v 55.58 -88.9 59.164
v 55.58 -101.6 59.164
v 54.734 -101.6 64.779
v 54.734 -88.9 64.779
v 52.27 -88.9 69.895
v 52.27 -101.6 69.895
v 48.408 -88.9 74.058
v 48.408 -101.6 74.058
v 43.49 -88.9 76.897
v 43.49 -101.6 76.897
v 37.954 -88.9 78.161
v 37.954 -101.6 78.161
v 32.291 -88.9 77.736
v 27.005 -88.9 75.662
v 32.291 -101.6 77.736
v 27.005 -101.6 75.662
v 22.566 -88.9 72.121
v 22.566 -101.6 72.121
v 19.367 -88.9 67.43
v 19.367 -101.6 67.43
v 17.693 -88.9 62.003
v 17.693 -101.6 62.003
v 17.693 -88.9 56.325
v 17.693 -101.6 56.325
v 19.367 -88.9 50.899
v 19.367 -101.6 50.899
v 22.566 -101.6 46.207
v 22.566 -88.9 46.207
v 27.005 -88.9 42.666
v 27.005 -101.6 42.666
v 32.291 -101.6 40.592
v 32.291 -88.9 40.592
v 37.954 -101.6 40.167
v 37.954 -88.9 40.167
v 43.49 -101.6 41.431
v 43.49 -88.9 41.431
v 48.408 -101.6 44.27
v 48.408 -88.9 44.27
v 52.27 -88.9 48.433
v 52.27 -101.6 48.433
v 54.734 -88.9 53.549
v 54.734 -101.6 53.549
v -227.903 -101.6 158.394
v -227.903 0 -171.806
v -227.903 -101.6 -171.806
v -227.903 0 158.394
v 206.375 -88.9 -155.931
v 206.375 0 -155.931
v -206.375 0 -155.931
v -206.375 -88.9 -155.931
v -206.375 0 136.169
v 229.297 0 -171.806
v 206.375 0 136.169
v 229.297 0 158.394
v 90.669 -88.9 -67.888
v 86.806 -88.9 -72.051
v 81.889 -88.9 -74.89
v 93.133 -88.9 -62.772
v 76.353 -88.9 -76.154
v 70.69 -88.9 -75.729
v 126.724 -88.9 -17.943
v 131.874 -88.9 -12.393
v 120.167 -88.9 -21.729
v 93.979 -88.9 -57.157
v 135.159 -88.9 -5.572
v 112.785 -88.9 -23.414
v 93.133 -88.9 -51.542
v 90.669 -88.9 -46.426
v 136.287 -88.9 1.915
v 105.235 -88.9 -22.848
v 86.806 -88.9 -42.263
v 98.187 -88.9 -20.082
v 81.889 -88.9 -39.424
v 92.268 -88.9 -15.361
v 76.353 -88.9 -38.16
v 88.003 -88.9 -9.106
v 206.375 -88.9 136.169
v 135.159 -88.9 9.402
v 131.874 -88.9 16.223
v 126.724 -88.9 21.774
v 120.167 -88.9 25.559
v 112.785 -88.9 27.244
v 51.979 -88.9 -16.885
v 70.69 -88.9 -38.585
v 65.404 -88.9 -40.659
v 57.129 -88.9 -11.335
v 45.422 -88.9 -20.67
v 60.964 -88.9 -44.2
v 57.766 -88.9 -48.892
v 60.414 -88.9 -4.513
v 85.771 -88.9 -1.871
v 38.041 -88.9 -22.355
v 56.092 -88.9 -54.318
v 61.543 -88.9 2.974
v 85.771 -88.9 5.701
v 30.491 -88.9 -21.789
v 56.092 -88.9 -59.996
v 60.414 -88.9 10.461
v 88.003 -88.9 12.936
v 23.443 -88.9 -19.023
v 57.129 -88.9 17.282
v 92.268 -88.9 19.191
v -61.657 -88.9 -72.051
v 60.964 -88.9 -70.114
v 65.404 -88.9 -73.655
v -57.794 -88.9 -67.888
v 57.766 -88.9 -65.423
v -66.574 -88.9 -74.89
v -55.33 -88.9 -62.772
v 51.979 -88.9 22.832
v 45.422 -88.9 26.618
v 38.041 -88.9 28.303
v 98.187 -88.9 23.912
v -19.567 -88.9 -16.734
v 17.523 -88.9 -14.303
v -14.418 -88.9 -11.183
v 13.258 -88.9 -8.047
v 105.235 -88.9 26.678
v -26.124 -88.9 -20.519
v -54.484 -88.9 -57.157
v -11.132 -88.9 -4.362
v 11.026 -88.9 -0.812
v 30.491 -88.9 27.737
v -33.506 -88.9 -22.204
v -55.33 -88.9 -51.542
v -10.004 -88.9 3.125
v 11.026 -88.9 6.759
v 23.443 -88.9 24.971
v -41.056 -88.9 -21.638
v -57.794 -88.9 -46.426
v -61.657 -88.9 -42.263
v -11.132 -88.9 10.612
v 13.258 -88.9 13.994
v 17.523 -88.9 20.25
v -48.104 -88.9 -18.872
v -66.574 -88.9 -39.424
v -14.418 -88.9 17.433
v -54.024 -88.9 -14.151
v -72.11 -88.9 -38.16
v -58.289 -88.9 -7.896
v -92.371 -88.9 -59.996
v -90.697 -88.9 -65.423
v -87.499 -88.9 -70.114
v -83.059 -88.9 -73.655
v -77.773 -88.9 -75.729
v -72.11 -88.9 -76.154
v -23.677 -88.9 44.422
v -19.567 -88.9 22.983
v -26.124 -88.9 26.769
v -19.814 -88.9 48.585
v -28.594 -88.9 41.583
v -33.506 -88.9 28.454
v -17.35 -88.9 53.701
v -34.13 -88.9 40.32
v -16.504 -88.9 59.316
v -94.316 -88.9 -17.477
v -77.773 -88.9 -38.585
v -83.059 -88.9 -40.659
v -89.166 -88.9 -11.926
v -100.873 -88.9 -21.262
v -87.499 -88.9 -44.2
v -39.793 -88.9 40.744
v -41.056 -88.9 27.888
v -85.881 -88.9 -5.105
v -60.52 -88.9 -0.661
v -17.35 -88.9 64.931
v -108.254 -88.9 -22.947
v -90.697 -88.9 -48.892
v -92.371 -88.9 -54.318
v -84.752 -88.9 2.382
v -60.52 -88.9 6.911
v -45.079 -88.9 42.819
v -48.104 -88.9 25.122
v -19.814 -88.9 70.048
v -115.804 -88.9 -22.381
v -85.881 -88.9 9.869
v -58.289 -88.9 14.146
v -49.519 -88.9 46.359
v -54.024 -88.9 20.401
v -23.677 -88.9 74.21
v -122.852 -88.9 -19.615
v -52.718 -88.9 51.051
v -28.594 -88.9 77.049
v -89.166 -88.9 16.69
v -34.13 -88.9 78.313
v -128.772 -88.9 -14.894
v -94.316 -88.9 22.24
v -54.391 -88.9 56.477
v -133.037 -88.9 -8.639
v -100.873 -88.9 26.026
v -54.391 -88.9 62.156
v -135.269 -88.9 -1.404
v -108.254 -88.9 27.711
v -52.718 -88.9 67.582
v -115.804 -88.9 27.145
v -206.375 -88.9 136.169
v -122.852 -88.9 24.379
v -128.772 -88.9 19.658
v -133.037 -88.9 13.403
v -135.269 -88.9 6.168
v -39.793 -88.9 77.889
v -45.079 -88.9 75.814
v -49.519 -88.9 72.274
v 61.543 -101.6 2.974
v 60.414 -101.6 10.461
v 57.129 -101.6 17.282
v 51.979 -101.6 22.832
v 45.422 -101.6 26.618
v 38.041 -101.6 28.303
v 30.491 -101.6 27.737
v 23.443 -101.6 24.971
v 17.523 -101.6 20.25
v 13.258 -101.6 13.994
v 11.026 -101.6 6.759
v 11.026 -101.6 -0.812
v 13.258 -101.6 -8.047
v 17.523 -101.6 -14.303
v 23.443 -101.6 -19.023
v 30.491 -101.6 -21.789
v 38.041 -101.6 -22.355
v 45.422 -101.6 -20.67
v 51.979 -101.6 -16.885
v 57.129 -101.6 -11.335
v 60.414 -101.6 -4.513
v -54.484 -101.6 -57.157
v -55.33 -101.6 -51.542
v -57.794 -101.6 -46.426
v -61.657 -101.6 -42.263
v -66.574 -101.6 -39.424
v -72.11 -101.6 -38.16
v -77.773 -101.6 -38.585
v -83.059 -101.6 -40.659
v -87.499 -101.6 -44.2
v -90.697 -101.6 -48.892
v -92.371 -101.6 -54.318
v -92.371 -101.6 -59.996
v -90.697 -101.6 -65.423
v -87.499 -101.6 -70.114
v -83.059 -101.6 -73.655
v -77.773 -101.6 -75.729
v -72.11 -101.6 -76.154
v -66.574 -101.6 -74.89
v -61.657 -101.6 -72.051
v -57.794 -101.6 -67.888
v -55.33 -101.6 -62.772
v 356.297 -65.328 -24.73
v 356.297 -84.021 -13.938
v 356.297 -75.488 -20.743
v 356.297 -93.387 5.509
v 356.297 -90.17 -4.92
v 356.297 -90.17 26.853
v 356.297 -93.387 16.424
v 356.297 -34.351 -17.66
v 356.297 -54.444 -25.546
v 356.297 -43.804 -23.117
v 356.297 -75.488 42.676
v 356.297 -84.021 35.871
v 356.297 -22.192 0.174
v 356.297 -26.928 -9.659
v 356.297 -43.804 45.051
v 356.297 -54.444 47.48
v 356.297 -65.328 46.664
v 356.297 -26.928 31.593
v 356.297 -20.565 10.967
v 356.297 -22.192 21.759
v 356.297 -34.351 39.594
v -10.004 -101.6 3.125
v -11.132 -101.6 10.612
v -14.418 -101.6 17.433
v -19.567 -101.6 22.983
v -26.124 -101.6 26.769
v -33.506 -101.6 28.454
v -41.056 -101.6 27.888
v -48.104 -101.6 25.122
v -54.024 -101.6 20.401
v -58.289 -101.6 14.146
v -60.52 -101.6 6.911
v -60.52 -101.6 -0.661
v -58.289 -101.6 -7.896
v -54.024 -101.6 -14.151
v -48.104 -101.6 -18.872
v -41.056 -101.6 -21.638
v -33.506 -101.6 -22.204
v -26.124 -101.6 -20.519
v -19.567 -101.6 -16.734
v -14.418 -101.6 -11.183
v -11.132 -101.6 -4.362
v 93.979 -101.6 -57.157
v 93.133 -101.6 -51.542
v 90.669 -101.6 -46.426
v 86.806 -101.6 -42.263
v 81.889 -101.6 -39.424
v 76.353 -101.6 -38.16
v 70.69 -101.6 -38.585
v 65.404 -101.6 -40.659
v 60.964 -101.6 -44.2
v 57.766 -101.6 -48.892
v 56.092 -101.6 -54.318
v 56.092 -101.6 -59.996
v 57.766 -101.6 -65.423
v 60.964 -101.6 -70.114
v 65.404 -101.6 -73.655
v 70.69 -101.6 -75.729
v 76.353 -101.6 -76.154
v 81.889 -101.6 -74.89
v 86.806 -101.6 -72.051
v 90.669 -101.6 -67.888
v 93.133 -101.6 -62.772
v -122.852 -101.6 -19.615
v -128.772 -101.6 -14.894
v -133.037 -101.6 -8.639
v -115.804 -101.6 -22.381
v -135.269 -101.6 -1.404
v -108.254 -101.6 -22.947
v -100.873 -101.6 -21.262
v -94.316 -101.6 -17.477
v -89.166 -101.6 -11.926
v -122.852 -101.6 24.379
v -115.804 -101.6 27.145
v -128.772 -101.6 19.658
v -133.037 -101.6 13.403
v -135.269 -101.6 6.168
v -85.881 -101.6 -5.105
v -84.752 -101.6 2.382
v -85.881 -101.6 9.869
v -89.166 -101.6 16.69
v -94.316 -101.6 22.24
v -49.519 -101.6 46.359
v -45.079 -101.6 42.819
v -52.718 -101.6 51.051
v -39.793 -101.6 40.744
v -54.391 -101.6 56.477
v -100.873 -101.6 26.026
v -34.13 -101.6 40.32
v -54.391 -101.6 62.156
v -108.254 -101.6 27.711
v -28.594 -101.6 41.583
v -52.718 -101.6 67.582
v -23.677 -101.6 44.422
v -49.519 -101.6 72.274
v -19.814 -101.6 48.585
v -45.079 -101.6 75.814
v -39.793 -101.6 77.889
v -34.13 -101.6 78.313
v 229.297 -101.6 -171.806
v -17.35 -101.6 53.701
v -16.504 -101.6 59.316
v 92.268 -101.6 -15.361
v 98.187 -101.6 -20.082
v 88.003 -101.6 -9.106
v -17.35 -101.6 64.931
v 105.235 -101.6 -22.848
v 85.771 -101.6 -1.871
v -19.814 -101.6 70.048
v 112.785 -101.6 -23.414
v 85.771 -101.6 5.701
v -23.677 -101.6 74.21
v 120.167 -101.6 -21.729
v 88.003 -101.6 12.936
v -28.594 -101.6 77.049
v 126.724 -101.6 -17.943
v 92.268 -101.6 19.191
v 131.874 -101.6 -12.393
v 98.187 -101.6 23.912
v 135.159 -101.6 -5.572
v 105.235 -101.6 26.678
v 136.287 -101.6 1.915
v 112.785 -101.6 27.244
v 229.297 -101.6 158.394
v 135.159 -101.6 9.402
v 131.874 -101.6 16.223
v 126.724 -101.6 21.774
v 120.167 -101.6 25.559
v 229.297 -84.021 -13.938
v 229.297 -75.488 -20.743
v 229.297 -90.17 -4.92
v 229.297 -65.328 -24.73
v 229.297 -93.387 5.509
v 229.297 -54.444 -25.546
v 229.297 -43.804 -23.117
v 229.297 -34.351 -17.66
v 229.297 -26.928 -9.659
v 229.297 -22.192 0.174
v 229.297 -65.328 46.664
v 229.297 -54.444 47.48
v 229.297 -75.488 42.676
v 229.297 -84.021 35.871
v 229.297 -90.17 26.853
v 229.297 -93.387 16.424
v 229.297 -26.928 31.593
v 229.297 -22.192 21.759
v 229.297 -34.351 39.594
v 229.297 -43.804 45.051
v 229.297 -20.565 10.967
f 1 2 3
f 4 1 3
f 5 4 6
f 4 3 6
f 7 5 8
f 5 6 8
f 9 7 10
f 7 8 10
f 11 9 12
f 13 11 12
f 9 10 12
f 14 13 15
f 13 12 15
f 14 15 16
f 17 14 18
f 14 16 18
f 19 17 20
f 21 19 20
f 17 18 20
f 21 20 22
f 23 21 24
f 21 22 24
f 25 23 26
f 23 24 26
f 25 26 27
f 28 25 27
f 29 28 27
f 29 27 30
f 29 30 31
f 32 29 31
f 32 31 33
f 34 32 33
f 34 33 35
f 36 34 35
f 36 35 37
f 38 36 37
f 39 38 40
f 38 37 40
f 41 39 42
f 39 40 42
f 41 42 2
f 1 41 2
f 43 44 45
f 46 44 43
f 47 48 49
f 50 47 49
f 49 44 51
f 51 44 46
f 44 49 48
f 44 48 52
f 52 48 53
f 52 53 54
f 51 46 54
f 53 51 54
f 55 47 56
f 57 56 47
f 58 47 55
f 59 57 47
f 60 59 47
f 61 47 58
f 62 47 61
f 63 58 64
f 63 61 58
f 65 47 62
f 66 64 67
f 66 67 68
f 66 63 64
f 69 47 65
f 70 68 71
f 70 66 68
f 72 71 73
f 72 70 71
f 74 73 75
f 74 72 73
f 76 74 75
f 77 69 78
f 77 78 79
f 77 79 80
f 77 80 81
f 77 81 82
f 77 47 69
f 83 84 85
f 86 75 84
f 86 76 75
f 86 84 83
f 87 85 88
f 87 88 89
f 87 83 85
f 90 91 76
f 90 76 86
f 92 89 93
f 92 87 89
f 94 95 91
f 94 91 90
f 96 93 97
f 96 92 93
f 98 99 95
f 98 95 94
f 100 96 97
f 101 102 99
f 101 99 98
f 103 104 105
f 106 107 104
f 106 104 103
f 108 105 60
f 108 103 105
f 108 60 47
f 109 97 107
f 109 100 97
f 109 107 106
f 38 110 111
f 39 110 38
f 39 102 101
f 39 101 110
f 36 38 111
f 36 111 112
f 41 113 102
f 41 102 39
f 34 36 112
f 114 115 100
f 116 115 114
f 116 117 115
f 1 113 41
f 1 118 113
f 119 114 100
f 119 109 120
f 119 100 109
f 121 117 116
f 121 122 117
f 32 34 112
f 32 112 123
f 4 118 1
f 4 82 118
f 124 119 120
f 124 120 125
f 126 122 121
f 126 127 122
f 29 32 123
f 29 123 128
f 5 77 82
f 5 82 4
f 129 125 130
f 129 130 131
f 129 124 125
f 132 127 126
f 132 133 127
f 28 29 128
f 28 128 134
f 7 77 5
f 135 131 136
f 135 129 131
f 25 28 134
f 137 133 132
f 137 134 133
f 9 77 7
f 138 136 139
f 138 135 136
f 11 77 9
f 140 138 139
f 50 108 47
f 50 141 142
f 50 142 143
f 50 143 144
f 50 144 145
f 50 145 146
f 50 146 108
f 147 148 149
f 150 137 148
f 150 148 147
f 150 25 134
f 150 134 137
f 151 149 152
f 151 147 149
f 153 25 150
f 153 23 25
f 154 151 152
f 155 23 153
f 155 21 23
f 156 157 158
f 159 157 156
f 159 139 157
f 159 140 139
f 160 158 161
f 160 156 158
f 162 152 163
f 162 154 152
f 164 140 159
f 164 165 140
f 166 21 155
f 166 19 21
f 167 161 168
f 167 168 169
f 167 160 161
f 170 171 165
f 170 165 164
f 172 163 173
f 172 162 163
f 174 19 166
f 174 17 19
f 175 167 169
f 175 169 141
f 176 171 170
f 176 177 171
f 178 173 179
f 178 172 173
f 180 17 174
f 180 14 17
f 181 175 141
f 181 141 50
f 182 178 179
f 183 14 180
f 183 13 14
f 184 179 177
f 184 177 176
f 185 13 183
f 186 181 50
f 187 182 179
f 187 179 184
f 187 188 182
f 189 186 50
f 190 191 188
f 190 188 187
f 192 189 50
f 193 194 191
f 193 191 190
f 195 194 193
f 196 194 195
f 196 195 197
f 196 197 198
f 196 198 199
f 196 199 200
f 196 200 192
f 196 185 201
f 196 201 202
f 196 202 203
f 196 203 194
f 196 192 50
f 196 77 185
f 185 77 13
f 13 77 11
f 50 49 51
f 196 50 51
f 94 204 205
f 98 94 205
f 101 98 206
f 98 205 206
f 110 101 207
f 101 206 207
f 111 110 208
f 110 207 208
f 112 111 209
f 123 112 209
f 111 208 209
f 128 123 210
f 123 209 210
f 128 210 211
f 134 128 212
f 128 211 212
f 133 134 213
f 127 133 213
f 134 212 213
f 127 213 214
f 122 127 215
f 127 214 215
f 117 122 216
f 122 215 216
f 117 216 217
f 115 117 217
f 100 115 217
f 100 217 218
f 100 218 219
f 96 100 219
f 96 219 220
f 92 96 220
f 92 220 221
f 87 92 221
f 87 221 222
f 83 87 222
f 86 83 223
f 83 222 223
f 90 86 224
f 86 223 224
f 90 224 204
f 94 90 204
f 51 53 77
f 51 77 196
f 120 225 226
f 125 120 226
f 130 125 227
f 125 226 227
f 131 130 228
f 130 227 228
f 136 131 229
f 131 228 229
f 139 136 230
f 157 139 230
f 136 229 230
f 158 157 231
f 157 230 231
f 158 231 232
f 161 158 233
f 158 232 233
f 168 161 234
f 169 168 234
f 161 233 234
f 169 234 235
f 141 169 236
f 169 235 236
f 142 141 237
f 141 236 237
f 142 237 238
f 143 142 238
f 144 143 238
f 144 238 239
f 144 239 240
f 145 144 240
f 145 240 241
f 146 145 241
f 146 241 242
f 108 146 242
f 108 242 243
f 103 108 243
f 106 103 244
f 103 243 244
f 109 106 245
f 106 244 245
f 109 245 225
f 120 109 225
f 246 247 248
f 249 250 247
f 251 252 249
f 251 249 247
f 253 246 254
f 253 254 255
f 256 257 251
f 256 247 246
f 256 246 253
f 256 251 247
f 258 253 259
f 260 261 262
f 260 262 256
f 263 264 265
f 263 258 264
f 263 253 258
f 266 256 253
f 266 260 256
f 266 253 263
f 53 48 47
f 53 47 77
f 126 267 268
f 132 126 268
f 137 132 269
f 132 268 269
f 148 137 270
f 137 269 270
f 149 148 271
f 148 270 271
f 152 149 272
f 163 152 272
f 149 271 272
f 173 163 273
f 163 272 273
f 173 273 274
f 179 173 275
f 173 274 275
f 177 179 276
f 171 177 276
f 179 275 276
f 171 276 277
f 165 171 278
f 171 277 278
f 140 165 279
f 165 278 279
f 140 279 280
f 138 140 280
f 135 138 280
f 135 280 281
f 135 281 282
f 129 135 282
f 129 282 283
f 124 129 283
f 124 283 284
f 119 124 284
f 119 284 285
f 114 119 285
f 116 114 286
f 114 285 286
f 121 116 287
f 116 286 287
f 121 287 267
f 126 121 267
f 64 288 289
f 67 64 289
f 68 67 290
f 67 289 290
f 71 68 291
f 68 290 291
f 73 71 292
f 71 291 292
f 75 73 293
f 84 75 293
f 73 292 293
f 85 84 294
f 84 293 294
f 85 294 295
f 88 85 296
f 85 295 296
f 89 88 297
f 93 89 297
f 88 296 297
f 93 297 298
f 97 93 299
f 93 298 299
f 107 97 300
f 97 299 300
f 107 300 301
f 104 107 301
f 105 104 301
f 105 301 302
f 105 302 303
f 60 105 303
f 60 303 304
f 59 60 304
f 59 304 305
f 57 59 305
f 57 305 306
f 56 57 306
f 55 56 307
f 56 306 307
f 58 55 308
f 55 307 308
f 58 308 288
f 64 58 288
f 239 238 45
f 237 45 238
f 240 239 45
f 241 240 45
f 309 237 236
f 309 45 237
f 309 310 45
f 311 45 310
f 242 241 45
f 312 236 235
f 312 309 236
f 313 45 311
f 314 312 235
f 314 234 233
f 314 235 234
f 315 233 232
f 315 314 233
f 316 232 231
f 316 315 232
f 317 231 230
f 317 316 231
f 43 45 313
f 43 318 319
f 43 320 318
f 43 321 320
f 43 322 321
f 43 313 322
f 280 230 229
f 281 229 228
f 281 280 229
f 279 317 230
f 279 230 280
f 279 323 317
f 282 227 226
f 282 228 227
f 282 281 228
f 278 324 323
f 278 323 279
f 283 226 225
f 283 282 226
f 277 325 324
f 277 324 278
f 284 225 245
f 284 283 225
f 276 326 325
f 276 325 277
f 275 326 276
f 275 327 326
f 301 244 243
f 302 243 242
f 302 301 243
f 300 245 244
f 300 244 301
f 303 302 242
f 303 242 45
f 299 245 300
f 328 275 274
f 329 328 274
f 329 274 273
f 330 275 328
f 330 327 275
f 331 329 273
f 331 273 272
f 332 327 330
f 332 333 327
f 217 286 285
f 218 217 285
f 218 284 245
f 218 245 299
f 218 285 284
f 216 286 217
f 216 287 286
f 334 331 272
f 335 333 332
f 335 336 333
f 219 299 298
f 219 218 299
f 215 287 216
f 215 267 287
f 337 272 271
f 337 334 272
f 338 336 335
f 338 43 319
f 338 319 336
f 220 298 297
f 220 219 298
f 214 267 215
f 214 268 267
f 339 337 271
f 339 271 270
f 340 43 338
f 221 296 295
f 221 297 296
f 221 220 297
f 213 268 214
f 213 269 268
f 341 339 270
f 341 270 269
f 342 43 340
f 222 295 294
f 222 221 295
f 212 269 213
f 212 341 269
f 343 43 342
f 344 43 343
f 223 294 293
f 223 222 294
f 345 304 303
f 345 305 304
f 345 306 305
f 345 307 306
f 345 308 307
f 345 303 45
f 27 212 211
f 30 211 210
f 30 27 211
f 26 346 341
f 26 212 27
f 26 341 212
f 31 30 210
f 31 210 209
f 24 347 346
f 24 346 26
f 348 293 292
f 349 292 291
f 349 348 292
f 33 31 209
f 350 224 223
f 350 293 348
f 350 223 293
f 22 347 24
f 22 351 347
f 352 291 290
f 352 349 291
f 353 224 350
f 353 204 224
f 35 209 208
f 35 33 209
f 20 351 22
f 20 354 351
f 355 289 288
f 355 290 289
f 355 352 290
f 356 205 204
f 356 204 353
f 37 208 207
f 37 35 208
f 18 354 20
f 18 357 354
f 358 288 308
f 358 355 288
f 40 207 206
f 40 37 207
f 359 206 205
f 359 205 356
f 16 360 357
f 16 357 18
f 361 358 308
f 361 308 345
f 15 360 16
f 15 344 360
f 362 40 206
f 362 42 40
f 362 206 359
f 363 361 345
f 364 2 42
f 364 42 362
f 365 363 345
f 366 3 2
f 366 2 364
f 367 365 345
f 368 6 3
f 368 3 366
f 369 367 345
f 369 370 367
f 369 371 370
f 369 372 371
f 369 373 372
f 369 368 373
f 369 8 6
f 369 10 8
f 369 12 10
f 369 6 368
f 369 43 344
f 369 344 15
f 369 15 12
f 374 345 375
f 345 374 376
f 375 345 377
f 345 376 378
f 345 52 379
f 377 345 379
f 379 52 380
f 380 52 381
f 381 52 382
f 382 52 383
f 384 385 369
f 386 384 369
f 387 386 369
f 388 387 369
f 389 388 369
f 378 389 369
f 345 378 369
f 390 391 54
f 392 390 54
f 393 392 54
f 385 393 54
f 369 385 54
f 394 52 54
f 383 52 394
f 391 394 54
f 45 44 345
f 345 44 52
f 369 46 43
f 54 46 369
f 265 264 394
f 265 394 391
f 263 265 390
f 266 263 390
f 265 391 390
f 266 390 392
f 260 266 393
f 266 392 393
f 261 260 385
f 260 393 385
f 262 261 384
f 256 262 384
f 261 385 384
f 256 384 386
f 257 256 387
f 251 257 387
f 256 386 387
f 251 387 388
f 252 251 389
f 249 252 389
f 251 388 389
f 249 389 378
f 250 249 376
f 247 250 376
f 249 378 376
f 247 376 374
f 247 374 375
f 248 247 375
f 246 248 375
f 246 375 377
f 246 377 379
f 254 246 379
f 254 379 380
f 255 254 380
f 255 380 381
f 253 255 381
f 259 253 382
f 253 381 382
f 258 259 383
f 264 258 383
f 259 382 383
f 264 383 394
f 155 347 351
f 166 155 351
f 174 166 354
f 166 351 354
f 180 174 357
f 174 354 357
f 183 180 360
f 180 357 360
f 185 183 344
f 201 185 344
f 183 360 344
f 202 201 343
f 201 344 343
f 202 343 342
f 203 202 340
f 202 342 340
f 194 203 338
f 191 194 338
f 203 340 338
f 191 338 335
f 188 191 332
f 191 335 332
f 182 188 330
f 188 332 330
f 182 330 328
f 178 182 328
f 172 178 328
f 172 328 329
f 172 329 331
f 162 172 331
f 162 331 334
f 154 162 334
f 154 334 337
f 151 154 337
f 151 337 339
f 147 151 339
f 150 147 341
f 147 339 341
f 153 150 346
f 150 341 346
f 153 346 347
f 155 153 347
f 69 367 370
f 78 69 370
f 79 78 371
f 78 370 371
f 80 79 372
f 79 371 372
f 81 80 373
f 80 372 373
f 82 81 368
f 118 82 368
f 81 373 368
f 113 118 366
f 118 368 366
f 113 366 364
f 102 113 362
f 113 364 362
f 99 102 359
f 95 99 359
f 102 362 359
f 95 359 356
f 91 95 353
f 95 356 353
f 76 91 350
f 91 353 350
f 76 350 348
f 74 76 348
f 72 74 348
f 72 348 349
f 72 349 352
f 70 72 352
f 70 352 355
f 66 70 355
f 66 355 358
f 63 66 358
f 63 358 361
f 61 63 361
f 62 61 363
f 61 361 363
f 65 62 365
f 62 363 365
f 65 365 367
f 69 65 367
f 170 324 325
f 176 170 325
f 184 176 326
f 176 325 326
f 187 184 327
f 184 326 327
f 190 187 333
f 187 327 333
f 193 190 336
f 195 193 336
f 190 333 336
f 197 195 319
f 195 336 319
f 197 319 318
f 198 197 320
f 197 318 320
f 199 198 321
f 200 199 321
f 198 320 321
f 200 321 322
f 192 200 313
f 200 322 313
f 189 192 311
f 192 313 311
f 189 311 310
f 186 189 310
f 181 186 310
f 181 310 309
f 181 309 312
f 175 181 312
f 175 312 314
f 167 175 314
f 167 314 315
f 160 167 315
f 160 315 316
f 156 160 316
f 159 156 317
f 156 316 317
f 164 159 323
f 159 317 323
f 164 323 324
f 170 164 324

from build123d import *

# Parameters (mm, degrees)
F0_W     = 457.2
F0_H     = 330.2
F1_DEPTH = 101.6
F2_W     = 412.75
F2_H     = 292.1
F3_DEPTH = 88.9
F4_R     = 25.4
F4_R_2   = 19.05
F5_DEPTH = 12.7
F6_R     = 36.615216
F7_DEPTH = 127


with BuildPart() as f1:
    # F0 (on Front) → F1 (new body)
    with BuildSketch(Plane.XZ):
        with Locations((0.697471, -6.70637)):
            Rectangle(F0_W, F0_H)
    extrude(amount=F1_DEPTH)

    # F2 (on face) → F3 (cut)
    with BuildSketch(Plane(origin=(0, 0, 0), x_dir=(-1, 0, 0), z_dir=(0, 1, 0))):
        with Locations((0, -9.88137)):
            Rectangle(F2_W, F2_H)
    extrude(amount=-F3_DEPTH, mode=Mode.SUBTRACT)

    # F4 (on face) → F5 (cut, through all)
    with BuildSketch(Plane.XZ.offset(101.6)):
        with Locations((-35.404028, 3.124894)):
            Circle(F4_R)
        with Locations((-110.152276, 2.381926)):
            Circle(F4_R)
        with Locations((-35.554084, 59.31631)):
            Circle(F4_R_2)
        with Locations((-73.534027, -57.157114)):
            Circle(F4_R_2)
        with Locations((36.530149, 59.164049)):
            Circle(F4_R_2)
        with Locations((110.887155, 1.915031)):
            Circle(F4_R)
        with Locations((36.142713, 2.973768)):
            Circle(F4_R)
        with Locations((74.928969, -57.157114)):
            Circle(F4_R_2)
    extrude(amount=-F5_DEPTH, mode=Mode.SUBTRACT)

    # F6 (on face) → F7 (join)
    with BuildSketch(Plane.YZ.offset(229.297471)):
        with Locations((-57.18055, 10.966711)):
            Circle(F6_R)
    extrude(amount=F7_DEPTH)


solid = f1.part
